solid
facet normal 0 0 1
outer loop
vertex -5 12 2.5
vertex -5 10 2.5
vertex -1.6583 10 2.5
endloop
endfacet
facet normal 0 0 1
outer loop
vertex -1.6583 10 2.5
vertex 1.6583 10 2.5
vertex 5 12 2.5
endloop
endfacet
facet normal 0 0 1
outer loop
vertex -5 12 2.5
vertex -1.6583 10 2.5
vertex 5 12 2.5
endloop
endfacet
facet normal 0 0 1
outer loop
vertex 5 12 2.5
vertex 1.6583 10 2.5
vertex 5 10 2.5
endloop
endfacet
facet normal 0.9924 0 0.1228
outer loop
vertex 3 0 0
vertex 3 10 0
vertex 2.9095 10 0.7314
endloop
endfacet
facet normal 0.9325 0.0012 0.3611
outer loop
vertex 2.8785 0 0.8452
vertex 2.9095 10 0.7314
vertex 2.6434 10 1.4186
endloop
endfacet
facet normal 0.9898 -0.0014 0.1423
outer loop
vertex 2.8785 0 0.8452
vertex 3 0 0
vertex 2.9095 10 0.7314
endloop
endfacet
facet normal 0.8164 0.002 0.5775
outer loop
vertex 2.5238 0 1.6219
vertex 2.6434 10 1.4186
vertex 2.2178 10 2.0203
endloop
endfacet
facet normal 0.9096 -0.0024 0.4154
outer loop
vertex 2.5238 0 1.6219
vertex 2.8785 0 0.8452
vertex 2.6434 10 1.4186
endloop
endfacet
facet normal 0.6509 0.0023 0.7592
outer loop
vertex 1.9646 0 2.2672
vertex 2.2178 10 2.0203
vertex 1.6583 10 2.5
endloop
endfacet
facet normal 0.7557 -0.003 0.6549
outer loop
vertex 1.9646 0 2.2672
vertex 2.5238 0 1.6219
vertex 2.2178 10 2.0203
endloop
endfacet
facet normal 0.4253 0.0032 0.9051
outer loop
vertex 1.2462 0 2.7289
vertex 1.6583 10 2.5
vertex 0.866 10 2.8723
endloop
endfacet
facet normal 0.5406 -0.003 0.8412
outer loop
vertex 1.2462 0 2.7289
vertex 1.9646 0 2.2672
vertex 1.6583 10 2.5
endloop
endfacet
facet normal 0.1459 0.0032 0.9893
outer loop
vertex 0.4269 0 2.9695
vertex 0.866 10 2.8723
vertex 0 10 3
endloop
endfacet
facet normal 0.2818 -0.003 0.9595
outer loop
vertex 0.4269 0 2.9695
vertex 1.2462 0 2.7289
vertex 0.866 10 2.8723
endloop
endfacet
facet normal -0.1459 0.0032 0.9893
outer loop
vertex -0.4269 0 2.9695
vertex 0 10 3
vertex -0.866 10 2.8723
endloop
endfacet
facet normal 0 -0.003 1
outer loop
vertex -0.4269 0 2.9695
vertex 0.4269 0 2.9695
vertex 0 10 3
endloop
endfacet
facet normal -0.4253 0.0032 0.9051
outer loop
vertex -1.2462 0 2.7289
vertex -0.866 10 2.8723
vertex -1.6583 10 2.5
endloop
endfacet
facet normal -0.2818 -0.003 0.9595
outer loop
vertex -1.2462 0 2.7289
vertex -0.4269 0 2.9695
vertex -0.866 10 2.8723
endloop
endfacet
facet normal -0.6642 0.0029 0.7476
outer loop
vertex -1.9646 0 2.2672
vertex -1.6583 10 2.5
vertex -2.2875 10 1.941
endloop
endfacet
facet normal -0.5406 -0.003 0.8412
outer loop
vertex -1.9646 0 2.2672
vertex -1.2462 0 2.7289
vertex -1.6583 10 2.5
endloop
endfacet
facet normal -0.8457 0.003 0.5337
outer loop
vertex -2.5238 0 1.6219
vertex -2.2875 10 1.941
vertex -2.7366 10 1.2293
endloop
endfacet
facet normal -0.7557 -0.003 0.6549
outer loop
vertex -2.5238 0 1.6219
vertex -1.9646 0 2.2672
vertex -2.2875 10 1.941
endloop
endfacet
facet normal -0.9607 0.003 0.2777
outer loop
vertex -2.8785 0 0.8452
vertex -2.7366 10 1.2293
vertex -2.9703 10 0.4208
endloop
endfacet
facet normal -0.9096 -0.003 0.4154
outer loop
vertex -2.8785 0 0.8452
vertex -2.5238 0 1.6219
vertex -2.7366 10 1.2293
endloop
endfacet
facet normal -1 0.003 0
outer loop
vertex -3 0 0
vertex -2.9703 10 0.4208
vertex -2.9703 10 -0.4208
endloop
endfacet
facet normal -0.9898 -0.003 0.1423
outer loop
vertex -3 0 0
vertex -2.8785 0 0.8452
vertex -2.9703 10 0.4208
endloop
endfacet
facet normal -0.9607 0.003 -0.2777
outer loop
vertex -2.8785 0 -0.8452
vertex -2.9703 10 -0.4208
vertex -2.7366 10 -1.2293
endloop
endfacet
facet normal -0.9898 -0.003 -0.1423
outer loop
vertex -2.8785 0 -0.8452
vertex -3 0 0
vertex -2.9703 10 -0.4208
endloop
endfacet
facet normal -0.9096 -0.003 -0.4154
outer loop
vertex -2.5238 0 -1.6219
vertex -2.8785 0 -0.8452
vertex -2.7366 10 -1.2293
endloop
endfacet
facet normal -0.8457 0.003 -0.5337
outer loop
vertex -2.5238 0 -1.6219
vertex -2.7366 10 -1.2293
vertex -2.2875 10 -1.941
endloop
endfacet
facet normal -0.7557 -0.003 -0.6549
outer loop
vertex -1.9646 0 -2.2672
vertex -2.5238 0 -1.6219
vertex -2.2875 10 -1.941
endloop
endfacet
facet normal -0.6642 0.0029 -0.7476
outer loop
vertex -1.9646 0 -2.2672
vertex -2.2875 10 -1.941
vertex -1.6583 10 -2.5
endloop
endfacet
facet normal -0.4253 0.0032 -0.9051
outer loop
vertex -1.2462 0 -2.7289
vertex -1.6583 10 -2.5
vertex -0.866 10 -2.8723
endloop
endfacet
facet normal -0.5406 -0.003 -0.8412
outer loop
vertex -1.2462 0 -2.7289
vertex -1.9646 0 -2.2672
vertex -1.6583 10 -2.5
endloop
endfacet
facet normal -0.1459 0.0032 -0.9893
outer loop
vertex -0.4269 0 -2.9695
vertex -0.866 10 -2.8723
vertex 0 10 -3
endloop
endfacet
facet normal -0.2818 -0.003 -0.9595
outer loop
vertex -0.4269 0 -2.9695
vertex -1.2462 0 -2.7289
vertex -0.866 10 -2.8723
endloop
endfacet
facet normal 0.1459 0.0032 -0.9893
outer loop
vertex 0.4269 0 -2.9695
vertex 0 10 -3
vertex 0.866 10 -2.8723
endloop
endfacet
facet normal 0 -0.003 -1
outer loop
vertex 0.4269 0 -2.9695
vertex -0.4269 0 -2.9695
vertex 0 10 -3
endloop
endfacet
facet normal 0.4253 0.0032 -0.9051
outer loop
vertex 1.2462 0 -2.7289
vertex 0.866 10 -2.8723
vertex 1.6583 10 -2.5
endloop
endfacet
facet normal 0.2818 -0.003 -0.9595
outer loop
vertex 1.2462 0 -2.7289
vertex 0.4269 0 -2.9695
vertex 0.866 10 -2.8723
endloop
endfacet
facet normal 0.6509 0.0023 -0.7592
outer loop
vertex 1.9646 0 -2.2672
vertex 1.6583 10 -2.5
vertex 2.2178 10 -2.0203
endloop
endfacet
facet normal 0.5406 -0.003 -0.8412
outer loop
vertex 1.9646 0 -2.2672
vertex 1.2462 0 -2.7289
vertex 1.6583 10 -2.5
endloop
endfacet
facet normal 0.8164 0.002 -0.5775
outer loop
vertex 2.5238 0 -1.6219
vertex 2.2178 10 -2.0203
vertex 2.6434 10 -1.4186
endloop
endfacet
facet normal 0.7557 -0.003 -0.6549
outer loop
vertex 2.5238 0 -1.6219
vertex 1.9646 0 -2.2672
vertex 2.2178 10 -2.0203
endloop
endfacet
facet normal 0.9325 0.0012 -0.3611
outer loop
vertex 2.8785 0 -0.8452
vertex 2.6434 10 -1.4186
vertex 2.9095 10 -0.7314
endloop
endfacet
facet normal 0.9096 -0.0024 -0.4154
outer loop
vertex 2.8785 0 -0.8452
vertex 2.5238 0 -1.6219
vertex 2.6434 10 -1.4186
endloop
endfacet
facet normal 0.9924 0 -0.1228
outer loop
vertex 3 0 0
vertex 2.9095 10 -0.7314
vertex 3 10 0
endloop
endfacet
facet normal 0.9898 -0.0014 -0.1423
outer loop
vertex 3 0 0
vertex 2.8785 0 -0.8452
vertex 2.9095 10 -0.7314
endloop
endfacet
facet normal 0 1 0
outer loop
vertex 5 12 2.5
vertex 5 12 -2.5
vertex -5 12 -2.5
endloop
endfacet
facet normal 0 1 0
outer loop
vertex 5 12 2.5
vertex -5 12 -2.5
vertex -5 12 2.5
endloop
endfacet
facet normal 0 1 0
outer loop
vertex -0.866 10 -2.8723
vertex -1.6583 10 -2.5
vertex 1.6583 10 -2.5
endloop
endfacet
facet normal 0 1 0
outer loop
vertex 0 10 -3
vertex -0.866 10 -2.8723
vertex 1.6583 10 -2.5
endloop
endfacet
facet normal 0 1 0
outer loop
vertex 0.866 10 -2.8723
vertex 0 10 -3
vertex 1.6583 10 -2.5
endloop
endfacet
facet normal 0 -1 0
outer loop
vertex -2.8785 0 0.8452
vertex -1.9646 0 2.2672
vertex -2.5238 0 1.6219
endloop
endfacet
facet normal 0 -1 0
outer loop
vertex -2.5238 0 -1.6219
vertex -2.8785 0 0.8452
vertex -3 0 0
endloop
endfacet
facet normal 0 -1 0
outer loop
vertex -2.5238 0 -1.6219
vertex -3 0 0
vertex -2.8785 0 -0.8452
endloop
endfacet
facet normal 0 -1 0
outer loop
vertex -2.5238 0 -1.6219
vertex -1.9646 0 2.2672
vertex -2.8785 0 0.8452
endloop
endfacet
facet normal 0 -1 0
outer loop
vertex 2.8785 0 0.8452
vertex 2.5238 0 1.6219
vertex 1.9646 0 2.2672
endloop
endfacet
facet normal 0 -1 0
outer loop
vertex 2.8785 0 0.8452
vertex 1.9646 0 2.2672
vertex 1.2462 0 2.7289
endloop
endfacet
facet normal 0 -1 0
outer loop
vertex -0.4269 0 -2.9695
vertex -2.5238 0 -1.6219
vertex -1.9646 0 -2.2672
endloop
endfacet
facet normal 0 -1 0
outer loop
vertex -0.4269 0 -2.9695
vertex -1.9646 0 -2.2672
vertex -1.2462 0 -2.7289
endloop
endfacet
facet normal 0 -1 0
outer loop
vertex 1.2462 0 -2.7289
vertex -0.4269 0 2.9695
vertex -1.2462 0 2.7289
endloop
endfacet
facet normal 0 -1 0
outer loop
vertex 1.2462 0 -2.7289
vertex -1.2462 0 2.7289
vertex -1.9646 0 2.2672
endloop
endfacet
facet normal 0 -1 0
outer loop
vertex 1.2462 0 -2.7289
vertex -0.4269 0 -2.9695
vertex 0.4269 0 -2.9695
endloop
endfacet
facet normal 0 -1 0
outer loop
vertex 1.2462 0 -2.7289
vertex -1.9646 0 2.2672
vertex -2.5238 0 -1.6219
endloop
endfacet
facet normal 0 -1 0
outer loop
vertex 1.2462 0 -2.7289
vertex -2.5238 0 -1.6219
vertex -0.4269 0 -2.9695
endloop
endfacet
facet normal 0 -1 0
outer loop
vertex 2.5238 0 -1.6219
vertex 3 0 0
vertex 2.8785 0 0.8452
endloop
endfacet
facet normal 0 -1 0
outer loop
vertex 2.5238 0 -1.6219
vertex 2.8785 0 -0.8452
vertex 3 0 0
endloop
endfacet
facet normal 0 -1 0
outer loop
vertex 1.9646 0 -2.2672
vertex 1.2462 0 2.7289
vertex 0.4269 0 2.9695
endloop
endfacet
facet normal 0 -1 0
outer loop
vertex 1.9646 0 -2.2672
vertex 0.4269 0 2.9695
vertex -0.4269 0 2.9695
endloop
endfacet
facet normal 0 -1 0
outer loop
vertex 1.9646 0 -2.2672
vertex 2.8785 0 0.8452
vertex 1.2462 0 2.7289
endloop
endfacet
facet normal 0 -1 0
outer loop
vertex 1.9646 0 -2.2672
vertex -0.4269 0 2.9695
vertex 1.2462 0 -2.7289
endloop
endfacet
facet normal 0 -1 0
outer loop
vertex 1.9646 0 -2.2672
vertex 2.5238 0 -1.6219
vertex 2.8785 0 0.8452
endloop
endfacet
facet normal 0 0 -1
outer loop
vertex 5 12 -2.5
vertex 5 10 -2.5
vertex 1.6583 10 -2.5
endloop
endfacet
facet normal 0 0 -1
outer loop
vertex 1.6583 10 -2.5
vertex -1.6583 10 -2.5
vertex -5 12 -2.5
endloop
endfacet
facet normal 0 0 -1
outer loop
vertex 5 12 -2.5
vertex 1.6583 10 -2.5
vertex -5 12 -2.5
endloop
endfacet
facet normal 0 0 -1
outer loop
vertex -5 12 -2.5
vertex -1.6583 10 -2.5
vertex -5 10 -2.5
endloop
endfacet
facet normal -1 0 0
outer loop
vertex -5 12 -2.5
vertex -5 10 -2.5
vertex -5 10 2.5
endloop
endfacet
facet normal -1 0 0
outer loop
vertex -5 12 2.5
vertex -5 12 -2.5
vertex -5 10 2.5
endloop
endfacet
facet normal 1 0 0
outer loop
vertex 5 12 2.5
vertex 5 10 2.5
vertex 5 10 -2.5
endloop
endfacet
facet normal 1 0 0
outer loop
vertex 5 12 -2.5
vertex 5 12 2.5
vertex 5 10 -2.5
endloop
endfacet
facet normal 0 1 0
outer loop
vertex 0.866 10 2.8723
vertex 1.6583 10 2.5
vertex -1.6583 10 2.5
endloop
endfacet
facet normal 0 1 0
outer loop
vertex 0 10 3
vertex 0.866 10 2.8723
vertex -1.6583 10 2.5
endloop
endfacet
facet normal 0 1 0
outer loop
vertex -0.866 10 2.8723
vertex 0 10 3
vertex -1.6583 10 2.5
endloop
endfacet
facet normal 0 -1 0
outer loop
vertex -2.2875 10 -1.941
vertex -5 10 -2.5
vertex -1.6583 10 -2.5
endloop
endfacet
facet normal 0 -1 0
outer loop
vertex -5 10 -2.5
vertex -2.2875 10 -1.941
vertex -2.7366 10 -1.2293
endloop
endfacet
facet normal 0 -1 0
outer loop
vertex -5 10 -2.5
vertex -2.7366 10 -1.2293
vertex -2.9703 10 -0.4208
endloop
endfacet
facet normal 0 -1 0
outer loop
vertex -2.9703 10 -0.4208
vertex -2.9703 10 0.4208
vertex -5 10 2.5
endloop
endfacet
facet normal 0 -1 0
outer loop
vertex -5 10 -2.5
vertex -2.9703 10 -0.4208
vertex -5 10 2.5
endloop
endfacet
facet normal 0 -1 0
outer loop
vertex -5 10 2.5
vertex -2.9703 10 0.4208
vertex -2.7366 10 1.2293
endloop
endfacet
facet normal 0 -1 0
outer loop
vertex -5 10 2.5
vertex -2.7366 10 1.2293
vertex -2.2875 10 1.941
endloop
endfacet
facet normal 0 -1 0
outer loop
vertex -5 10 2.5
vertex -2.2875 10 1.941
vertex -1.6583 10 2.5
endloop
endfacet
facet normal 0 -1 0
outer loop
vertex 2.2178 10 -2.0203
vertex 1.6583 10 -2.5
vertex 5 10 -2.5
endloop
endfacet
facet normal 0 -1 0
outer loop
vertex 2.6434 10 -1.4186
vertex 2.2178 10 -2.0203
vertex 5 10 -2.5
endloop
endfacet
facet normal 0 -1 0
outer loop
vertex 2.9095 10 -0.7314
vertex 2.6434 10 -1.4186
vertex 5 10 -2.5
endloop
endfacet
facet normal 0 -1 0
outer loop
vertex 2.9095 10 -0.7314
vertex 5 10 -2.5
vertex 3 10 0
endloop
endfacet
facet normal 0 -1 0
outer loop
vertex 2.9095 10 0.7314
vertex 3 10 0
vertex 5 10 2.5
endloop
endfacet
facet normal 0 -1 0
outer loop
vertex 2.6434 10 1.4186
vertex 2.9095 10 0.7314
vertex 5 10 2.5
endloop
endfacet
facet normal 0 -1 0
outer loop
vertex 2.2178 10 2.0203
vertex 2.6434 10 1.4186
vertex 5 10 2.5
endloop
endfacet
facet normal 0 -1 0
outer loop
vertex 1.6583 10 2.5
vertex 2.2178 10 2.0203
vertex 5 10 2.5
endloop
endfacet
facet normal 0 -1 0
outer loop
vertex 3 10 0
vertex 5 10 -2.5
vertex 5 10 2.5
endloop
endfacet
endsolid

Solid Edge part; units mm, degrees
sketch "Sketch1" plane through (0, 0, 0) normal (0, -1, 0) x (1, 0, 0)
  circle A0 centre (0, 0) radius 3
extrude "Protrusion1" add sketch "Sketch1" against normal blind 10
sketch "Sketch2" plane through (0, 10, 0) normal (0, 1, 0) x (1, 0, 0)
  line L0 (-5, -2.5) -> (5, -2.5)
  line L1 (5, -2.5) -> (5, 2.5)
  line L2 (5, 2.5) -> (-5, 2.5)
  line L3 (-5, 2.5) -> (-5, -2.5)
extrude "ExtrudedProtrusion_3" add sketch "Sketch2" along normal blind 2
